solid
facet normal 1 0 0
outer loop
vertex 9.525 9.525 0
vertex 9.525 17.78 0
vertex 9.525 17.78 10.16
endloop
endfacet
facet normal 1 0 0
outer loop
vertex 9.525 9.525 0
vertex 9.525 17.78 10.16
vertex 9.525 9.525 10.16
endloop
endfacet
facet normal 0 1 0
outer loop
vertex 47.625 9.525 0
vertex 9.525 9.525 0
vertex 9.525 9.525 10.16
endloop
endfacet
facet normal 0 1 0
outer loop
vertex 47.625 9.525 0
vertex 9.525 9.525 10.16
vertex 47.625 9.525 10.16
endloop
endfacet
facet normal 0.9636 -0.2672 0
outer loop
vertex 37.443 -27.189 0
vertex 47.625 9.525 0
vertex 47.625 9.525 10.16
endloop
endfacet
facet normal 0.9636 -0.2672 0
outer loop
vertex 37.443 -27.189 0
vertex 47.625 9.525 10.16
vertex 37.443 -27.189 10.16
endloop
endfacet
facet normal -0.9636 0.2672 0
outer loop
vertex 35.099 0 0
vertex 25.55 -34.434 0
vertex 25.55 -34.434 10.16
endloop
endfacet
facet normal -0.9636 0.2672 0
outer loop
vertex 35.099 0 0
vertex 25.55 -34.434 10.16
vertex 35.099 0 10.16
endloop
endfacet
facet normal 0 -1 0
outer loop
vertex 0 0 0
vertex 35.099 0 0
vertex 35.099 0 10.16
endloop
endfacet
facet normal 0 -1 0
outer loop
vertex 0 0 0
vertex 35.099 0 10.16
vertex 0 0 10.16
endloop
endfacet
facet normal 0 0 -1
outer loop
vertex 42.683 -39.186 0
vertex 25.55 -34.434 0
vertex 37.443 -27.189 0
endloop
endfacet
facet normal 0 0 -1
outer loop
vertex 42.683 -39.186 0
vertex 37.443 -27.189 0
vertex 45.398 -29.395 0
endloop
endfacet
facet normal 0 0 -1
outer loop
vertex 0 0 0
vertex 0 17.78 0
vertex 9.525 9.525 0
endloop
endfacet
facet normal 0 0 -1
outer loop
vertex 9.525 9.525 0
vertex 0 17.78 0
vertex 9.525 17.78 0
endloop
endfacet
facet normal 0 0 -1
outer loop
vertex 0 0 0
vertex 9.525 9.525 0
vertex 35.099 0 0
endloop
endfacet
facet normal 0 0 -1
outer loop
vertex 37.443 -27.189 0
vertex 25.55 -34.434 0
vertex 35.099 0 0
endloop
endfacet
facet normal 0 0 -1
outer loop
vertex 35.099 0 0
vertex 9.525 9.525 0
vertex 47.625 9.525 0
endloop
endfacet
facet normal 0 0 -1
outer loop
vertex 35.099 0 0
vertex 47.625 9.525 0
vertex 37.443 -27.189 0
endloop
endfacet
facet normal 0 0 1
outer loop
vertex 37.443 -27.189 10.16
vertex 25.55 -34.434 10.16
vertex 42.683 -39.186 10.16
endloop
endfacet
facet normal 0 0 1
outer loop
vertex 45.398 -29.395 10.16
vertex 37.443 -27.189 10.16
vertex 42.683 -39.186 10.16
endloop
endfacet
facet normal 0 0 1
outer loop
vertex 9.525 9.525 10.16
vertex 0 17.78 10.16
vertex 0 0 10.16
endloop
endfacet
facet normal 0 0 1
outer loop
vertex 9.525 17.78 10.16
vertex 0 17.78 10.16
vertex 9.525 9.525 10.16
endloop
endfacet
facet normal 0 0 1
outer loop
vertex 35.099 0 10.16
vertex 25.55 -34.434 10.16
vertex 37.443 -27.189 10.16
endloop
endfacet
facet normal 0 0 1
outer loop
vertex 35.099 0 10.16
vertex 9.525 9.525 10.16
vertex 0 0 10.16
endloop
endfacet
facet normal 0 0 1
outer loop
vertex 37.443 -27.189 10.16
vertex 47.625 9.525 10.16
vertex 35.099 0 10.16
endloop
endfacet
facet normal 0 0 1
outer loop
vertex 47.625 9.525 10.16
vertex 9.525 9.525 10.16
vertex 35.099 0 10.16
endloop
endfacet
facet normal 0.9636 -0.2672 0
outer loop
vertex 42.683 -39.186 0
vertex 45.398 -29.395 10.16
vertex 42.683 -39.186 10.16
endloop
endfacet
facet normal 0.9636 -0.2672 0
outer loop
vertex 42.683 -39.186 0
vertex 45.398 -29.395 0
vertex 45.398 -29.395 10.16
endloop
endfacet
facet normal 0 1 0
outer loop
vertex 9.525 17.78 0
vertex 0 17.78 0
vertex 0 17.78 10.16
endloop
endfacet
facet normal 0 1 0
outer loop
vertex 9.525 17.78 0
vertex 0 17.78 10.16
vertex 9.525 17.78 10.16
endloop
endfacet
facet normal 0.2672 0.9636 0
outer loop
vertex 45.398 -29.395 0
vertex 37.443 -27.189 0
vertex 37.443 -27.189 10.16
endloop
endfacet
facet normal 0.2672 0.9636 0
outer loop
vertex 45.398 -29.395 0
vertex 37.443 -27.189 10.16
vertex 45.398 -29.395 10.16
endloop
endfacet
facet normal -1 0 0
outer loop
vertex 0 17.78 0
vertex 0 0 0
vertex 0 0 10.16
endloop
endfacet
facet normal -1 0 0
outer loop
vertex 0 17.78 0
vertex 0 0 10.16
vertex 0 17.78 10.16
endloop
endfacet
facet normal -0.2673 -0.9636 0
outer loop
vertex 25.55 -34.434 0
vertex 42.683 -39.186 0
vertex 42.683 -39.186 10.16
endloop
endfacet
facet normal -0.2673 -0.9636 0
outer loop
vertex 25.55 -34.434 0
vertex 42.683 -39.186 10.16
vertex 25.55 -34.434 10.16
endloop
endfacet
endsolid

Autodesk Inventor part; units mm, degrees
ref_plane "YZ Plane" through (0, 0, 0) normal (1, 0, 0) x (0, 1, 0)
ref_plane "XZ Plane" through (0, 0, 0) normal (0, 1, 0) x (-1, 0, 0)
ref_plane "XY Plane" through (0, 0, 0) normal (0, 0, 1) x (1, 0, 0)
sketch "Sketch1" plane through (0, 0, 0) normal (0, 0, 1) x (1, 0, 0)
  line L0 (0, 0) -> (0, 17.78)
  line L1 (0, 17.78) -> (9.525, 17.78)
  line L2 (9.525, 17.78) -> (9.525, 9.525)
  line L3 (9.525, 9.525) -> (47.625, 9.525)
  line L4 (47.625, 9.525) -> (37.4432, -27.1893)
  line L5 (37.4432, -27.1893) -> (45.398, -29.3954)
  line L6 (45.398, -29.3954) -> (42.6828, -39.1859)
  line L7 (42.6828, -39.1859) -> (25.5495, -34.4344)
  line L8 (25.5495, -34.4344) -> (35.099, 0)
  line L9 (35.099, 0) -> (0, 0)
  dimension "d7" = 17.78
  dimension "d8" = 9.525
  dimension "d9" = 8.255
  dimension "d10" = 38.1
  dimension "d11" = 38.1
  dimension "d12" = 74.5
  dimension "d13" = 8.255
  dimension "d14" = 10.16
  dimension "d15" = 17.78
extrude "Extrusion1" add sketch "Sketch1" along normal blind 10.16
properties part number "AcutePlateAttacher_v1"
